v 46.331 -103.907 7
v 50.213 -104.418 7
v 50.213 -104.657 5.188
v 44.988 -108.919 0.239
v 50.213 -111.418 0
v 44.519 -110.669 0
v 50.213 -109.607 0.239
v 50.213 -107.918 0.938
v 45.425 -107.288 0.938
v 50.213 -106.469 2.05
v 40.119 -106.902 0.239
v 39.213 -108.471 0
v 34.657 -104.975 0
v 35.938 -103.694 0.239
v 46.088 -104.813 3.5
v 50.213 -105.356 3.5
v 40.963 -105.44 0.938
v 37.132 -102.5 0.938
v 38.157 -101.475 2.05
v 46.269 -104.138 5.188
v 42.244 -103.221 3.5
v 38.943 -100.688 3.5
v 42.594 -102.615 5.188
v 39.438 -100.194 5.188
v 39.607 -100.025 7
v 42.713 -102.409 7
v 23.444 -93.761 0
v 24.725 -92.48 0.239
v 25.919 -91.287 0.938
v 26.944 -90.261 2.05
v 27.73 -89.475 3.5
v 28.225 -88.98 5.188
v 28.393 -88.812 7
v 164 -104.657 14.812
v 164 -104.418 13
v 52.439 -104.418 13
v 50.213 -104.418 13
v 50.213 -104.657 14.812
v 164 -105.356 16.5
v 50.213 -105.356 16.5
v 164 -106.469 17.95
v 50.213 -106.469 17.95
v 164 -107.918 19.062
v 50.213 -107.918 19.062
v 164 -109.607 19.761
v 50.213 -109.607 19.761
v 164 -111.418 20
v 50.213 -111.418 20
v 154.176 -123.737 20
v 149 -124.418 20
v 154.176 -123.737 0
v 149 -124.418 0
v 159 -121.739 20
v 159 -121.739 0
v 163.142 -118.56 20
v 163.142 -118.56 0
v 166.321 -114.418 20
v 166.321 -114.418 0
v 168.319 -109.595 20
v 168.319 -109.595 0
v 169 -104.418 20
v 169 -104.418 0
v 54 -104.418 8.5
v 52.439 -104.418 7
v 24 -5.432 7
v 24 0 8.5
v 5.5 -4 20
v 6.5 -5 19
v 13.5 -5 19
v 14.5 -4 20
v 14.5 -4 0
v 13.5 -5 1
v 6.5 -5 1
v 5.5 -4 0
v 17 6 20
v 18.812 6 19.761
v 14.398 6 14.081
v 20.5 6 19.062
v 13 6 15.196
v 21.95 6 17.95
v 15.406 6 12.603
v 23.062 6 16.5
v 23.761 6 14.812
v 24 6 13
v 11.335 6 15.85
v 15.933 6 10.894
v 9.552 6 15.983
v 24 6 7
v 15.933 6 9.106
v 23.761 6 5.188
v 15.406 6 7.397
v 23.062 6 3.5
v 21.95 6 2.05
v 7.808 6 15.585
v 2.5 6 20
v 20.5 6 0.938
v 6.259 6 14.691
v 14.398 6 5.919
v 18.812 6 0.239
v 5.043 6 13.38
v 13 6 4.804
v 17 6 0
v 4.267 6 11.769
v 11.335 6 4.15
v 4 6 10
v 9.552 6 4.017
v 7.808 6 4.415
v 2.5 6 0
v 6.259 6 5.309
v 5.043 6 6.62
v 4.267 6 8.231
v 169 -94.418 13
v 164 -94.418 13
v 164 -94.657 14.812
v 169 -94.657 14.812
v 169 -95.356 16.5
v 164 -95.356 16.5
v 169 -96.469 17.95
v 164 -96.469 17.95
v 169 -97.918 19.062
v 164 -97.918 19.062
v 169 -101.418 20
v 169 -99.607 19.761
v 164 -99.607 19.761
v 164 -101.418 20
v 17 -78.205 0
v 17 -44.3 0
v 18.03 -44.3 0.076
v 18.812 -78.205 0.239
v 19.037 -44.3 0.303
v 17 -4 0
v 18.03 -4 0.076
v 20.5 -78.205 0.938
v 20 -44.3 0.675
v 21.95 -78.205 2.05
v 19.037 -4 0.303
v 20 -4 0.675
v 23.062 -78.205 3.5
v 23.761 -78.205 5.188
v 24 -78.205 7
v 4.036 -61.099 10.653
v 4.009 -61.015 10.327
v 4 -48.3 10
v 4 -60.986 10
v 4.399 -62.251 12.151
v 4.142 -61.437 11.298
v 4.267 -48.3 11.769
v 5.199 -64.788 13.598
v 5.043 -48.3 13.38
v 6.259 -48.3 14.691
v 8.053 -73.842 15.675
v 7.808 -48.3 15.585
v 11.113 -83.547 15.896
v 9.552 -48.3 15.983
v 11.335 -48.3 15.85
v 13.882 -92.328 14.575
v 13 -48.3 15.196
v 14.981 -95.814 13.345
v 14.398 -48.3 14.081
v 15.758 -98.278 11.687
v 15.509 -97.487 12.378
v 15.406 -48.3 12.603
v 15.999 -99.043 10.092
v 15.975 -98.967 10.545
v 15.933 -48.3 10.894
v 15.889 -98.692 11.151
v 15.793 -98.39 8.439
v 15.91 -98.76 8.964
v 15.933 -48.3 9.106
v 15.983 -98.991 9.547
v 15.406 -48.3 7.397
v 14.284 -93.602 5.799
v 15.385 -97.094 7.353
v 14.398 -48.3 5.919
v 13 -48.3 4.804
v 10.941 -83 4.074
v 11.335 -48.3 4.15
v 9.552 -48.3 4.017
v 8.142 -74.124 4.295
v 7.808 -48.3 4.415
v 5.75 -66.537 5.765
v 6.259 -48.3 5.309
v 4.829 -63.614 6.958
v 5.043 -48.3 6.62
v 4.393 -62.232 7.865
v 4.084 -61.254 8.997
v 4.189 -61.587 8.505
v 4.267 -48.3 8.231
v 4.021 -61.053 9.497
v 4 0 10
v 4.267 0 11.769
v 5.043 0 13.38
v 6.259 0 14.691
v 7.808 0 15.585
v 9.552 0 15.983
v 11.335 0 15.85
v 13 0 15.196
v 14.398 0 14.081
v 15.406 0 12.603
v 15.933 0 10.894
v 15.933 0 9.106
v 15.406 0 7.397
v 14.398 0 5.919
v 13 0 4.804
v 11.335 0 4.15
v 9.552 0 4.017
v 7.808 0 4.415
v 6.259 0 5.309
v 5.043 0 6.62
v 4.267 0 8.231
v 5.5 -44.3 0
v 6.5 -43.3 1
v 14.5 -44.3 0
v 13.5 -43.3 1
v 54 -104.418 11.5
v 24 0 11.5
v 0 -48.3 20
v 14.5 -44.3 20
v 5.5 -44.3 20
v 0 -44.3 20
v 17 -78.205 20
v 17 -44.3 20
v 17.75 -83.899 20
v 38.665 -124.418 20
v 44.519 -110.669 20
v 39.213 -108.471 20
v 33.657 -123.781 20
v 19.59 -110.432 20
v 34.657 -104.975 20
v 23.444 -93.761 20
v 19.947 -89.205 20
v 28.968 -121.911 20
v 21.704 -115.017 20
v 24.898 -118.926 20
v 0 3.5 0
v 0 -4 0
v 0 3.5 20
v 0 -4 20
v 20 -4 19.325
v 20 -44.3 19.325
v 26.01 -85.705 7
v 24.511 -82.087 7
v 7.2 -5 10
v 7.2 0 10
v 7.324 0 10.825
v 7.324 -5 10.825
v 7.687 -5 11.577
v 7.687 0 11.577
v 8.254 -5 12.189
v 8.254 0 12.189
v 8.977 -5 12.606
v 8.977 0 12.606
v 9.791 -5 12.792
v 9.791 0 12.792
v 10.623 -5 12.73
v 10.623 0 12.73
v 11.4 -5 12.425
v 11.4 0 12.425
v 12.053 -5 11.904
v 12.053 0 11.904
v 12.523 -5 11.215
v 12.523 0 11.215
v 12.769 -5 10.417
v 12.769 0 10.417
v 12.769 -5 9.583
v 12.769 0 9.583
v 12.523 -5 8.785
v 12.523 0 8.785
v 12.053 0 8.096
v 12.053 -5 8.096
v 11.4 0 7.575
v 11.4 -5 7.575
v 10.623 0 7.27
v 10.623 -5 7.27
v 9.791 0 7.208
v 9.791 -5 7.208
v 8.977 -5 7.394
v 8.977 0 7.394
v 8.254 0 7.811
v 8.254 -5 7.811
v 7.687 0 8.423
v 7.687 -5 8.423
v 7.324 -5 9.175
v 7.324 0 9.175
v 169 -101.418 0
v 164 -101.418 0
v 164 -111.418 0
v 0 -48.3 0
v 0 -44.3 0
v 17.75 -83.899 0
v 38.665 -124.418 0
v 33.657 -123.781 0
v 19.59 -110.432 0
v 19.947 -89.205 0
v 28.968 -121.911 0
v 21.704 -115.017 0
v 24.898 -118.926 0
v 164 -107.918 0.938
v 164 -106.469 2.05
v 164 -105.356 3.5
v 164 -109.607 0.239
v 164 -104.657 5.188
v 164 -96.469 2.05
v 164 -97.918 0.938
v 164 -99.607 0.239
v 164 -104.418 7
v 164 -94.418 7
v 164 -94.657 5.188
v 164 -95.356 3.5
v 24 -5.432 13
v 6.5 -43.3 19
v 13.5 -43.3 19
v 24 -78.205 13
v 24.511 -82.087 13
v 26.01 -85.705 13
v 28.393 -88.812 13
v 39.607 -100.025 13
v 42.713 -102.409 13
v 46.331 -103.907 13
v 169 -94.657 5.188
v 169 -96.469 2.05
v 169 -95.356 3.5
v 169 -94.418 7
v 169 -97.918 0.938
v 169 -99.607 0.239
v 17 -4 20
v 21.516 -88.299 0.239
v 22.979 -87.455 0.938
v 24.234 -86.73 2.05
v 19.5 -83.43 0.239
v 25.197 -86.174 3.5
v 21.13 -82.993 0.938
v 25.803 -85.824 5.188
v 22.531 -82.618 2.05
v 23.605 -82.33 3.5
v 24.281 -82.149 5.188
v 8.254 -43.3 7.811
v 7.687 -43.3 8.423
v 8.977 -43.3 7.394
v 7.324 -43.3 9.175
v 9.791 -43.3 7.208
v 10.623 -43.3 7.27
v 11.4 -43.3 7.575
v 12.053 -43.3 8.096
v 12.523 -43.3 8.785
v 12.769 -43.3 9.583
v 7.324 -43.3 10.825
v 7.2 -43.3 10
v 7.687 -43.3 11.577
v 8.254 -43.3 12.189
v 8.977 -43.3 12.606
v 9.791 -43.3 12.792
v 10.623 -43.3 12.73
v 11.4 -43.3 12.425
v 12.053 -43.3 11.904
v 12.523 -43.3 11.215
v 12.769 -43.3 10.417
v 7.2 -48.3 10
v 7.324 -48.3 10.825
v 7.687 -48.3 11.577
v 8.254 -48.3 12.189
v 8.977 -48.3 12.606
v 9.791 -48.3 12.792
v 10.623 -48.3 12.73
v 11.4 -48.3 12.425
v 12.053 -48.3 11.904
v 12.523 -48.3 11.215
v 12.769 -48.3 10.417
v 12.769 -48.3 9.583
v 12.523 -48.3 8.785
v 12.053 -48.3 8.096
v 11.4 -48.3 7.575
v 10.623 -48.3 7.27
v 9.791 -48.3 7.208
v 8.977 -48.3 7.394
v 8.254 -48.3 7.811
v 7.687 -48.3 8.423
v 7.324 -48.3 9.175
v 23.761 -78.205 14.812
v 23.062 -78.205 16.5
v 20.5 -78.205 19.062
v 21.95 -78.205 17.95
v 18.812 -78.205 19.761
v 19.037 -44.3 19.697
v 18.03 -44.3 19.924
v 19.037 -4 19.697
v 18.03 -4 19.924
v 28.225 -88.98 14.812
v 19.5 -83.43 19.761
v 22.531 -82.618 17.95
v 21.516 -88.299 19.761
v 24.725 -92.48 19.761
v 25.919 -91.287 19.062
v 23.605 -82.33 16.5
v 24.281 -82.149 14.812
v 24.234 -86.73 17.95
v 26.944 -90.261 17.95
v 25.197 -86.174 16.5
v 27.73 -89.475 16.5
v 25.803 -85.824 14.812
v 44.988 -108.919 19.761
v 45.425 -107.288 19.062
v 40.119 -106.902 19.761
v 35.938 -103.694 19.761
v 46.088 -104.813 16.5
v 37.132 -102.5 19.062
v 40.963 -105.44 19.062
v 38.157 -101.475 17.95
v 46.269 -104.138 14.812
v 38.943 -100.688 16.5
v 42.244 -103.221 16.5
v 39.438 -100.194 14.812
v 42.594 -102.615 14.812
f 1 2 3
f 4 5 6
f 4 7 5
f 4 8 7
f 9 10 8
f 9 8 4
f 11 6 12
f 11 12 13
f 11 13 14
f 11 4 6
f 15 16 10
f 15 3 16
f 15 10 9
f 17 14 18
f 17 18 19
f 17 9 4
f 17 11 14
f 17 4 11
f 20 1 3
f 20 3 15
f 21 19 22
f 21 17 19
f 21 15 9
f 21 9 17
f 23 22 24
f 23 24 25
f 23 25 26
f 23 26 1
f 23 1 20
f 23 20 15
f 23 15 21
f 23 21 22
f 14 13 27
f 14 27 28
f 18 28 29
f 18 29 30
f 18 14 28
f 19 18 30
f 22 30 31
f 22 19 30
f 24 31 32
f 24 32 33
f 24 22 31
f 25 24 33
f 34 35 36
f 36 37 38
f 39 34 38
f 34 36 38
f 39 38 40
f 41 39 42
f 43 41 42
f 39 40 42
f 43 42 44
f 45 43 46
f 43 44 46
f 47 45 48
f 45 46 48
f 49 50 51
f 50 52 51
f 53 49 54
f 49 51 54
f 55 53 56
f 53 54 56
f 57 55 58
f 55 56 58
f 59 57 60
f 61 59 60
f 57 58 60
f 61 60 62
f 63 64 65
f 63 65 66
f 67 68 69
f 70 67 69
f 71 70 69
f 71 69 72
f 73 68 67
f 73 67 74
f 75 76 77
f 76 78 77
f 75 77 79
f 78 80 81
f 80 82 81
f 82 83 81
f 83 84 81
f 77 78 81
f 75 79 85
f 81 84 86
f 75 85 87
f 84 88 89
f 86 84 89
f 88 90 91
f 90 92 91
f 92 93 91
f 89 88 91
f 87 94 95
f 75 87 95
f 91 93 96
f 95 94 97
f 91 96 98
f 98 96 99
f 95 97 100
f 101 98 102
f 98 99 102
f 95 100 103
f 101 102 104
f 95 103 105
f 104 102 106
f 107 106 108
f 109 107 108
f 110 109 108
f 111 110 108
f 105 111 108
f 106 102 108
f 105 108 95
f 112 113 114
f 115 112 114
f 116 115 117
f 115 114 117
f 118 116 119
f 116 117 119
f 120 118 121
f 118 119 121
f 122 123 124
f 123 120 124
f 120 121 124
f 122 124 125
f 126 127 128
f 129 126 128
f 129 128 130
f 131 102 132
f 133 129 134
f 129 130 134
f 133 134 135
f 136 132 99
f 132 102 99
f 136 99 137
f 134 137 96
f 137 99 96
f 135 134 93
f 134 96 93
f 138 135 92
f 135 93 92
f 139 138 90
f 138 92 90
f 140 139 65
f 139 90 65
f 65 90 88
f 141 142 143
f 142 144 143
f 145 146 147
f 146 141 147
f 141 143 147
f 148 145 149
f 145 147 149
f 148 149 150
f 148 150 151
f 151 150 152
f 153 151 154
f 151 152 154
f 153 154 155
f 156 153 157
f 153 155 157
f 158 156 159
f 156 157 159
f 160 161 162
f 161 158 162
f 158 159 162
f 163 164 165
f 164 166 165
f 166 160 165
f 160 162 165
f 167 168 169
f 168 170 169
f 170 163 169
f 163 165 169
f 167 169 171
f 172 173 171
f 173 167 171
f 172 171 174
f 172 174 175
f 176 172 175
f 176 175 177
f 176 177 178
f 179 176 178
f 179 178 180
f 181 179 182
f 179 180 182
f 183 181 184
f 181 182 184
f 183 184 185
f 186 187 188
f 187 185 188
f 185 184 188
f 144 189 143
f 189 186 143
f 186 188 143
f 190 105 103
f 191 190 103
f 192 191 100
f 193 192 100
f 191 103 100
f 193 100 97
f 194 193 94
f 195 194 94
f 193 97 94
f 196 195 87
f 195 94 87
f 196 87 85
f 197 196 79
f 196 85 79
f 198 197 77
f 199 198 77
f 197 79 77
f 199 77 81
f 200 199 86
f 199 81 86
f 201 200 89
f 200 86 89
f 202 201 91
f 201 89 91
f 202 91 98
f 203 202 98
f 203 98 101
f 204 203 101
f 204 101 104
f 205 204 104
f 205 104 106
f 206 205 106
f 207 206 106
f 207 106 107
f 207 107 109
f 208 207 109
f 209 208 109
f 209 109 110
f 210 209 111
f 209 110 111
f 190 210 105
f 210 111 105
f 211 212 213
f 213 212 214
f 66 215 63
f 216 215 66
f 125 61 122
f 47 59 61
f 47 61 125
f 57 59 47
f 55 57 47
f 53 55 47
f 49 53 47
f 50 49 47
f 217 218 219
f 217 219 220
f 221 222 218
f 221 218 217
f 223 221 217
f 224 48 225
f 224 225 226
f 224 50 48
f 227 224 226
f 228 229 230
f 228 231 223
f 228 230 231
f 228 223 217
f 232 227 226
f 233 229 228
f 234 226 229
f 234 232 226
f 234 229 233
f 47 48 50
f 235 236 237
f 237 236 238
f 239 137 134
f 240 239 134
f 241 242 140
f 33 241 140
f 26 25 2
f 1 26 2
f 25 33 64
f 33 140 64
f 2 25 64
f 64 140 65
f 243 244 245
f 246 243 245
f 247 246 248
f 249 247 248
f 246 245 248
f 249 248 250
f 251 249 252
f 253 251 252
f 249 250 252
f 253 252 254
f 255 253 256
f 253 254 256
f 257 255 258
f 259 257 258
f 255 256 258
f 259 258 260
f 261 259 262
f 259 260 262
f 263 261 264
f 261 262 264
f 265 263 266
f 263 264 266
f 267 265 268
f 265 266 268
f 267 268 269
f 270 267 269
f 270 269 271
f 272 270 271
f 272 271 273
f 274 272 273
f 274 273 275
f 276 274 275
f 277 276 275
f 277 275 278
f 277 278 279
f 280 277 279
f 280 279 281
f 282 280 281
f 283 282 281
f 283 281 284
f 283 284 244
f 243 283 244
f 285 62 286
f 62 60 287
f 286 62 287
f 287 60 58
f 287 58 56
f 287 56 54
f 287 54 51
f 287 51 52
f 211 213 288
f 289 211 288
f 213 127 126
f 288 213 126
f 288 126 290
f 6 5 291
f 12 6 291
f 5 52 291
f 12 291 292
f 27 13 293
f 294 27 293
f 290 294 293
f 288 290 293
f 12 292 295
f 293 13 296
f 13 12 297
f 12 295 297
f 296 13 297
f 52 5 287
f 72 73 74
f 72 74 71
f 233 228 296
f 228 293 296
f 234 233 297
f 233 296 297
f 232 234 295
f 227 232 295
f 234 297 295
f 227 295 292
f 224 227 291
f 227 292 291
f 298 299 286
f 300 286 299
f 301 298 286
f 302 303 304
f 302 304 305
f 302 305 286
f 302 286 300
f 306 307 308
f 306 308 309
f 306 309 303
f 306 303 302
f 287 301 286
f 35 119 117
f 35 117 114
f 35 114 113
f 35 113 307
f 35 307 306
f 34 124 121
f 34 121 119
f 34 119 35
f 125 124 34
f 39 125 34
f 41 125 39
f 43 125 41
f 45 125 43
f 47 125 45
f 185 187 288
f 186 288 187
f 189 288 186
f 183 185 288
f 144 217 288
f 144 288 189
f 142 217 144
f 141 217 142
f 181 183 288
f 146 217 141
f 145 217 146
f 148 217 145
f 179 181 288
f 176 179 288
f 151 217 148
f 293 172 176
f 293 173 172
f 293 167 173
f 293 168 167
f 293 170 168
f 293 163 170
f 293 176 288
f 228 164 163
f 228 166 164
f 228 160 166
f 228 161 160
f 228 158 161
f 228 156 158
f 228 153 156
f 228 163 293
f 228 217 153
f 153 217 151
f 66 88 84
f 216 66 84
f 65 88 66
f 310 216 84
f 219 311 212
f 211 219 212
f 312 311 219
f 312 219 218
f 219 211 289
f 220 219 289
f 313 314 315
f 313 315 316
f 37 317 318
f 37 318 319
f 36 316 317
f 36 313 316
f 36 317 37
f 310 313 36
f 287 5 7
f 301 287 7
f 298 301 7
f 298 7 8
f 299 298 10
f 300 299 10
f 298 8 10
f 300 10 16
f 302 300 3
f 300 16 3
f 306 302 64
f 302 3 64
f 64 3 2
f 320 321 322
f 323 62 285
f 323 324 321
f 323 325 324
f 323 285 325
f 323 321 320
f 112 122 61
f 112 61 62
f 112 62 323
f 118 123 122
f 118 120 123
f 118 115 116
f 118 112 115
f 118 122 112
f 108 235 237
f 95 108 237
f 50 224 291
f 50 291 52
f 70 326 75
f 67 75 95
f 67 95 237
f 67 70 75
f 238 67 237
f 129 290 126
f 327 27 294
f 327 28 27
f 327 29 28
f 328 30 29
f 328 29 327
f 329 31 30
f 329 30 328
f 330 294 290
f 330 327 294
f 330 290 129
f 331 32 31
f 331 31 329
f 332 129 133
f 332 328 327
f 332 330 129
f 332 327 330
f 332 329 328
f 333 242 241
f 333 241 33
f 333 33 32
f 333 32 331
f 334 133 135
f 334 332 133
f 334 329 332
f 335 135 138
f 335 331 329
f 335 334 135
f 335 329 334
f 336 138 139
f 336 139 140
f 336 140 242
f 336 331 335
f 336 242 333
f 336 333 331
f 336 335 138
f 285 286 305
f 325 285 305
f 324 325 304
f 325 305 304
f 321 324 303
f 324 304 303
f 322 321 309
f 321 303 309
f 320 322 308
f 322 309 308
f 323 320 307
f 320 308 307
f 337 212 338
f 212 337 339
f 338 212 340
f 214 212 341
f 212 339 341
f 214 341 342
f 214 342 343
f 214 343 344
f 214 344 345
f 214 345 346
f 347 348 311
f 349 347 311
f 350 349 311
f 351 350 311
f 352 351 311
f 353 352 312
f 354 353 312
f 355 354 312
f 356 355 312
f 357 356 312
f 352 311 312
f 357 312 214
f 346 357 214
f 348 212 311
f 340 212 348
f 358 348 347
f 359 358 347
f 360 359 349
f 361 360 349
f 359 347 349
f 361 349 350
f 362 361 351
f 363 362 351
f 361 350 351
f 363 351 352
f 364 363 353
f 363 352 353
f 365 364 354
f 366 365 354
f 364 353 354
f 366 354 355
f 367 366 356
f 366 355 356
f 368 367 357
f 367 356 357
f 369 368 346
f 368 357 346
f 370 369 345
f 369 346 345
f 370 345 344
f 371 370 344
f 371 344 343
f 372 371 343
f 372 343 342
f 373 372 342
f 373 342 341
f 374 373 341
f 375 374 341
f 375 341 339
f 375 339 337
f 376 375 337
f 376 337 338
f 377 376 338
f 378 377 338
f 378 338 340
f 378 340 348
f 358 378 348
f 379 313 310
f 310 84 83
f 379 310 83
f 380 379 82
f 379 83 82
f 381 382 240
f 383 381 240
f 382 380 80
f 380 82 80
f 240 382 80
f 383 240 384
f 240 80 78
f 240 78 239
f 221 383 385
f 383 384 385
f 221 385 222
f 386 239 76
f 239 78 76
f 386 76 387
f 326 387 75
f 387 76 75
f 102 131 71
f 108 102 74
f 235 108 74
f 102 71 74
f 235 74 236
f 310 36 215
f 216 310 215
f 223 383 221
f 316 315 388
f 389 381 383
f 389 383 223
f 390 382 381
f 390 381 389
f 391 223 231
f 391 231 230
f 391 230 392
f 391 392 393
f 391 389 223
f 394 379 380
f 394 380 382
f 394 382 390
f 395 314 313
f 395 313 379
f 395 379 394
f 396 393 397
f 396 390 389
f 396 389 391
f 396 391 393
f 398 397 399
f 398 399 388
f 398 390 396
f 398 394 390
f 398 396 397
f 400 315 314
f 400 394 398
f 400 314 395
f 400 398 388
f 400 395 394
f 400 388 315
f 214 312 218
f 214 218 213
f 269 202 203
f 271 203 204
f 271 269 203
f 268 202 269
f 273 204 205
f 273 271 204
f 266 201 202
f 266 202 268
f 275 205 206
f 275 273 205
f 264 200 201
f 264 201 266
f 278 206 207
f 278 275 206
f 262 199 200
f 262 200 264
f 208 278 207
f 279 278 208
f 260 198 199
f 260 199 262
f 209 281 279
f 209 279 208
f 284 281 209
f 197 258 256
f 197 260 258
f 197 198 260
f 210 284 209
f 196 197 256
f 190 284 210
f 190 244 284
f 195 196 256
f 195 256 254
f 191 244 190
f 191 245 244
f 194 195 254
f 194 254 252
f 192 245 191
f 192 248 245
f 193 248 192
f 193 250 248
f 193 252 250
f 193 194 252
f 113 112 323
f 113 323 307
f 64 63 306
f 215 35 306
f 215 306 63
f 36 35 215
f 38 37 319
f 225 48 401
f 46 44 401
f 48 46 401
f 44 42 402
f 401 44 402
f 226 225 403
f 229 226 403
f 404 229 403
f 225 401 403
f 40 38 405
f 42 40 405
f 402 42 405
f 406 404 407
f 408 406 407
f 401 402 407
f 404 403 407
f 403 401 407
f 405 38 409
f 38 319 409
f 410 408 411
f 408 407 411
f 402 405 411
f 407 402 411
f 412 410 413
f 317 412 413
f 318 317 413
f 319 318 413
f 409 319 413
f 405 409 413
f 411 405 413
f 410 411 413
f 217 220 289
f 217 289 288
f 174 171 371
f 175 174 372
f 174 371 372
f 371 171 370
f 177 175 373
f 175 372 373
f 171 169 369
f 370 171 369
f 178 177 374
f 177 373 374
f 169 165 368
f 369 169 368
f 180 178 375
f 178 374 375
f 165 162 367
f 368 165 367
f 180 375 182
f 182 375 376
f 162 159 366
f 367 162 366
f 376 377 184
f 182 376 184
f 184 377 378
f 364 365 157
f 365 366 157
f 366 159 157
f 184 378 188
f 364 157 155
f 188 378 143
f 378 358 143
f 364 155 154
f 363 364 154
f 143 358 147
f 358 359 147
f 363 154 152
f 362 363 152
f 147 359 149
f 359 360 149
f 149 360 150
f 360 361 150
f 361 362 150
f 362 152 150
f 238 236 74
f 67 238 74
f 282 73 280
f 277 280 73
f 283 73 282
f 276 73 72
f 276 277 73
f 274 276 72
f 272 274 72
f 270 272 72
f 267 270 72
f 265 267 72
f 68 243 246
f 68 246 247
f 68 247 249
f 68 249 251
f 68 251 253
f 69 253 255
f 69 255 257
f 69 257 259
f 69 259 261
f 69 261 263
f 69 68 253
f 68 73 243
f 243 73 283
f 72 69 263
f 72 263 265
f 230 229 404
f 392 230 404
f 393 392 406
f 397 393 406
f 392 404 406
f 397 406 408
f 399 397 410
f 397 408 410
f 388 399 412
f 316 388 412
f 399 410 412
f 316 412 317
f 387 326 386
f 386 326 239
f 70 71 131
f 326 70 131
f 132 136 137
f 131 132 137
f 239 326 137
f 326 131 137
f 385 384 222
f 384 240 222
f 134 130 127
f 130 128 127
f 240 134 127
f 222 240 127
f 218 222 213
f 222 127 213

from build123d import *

# Parameters (mm, degrees)
F1_DEPTH      = 20
F2_W          = 9
F2_H          = 1
F3_DEPTH      = 20
F4_SIZE       = 0.99999
F6_DEPTH      = 20
F9_DEPTH      = 3
F10_SIZE      = 20
F11_DEPTH     = 6
F13_R         = 2.8
F14_DEPTH     = 130.4192752567
F15_R         = 6
F16_DEPTH     = 76.1192752567
F17_R         = 6
F18_DEPTH     = 6
F19_R         = 15
F20_T1_DEPTH  = 113.7867965644
F20_T3_DEPTH  = 40
F20_T5_DEPTH  = 15.8578643763
F20_T7_DEPTH  = 101.7050718211
F20_T10_ANGLE = 45
F20_T12_ANGLE = 45
F20_T14_ANGLE = 45
F20_T16_ANGLE = 45
F21_SIZE      = 1.5
F22_R         = 20
F23_SIZE      = 2.5


# Not quite as in the source:
# - a fillet or chamfer that OpenCascade refuses, or shapes differently, is made with other operations: its cross-section is extruded or revolved along the edge and cut away or added
# - a fillet or chamfer is up to 0.001 mm smaller than in the source, because OpenCascade refuses the exact size


with BuildPart() as f1:
    # F0 (on Top) → F1 (new body)
    with BuildSketch(Plane.XY):
        Polygon((24, 0), (0, 0), (0, -4), (20, -4), (20, -44.3), (0, -44.3), (0, -48.3), (24, -48.3), align=None)
    extrude(amount=F1_DEPTH)

    # F2 (on face) → F3 (join, through all)
    with BuildSketch(Plane.XY.offset(20)):
        with Locations((10, -4.5)):
            Rectangle(F2_W, F2_H)
        with Locations((10, -43.8)):
            Rectangle(F2_W, F2_H)
    extrude(amount=-F3_DEPTH)

    # F4 (size 1 in the source; OpenCascade refuses exactly that, so slightly less here)
    f4_edges = [f1.edges().sort_by_distance(p)[0] for p in [
        (5.5, -5, 10),
        (14.5, -5, 10),
        (10, -5, 20),
        (10, -5, 0),
        (14.5, -43.3, 10),
        (5.5, -43.3, 10),
        (10, -43.3, 20),
        (10, -43.3, 0),
    ]]
    chamfer(f4_edges, length=F4_SIZE)

    # F5 (on face) → F6 (join, through all)
    with BuildSketch(Plane.XY.offset(20)):
        Polygon((24, -48.3), (0, -48.3), (24, -124.4182752567), (169, -124.4182752567), (169, -94.4182752567), (164, -94.4182752567), (164, -104.4182752567), (24, -104.4182752567), align=None)
    extrude(amount=-F6_DEPTH)

    # F8 (on offset) → F9 (join, symmetric)
    with BuildSketch(Plane.XY.offset(10)):
        Polygon((54, -104.4182752567), (24, 0), (24, -104.4182752567), align=None)
    extrude(amount=F9_DEPTH, both=True)

    # F10
    f10_edges = [f1.edges().sort_by_distance(p)[0] for p in [
        (24, -104.418275, 16.5),
        (24, -104.418275, 3.5),
    ]]
    chamfer(f10_edges, length=F10_SIZE)

    # F11 (add): a face of the model
    f11_faces = [f1.faces().sort_by_distance(p)[0] for p in [
        (12, 0, 10),
    ]]
    extrude(f11_faces, amount=F11_DEPTH)

    # F13 (on face) → F14 (cut, through all)
    with BuildSketch(Plane(origin=(0, 6, 0), x_dir=(-1, 0, 0), z_dir=(0, 1, 0))):
        with Locations((-10, 10)):
            Circle(F13_R)
    extrude(amount=-F14_DEPTH, mode=Mode.SUBTRACT)

    # F15 (on offset) → F16 (cut, through all)
    with BuildSketch(Plane(origin=(0, -48.3, 0), x_dir=(-1, 0, 0), z_dir=(0, 1, 0))):
        with Locations((-10, 10)):
            Circle(F15_R)
    extrude(amount=-F16_DEPTH, mode=Mode.SUBTRACT)

    # F17 (on face) → F18 (cut)
    with BuildSketch(Plane(origin=(0, 6, 0), x_dir=(-1, 0, 0), z_dir=(0, 1, 0))):
        with Locations((-10, 10)):
            Circle(F17_R)
    extrude(amount=-F18_DEPTH, mode=Mode.SUBTRACT)

    # F19
    f19_edges = [f1.edges().sort_by_distance(p)[0] for p in [
        (44, -104.418275, 3.5),
        (24, -84.418275, 3.5),
        (24, -84.418275, 16.5),
        (44, -104.418275, 16.5),
    ]]
    fillet(f19_edges, radius=F19_R)

    # F20: fillet of radius 7 on 12 edges, made by hand

    # F20_s2 → F20_t1 (cut)
    with BuildSketch(Plane.YZ.offset(50.2132034356)):
        with BuildLine():
            ThreePointArc((-104.4182752567, 13), (-106.4685277884, 17.9497474683), (-111.4182752567, 20))
            Line((-111.4182752567, 20), (-104.4182752567, 20))
            Line((-104.4182752567, 20), (-104.4182752567, 13))
        make_face()
        with BuildLine():
            ThreePointArc((-111.4182752567, 0), (-106.4685277884, 2.0502525317), (-104.4182752567, 7))
            Line((-104.4182752567, 7), (-104.4182752567, 0))
            Line((-104.4182752567, 0), (-111.4182752567, 0))
        make_face()
    extrude(amount=F20_T1_DEPTH, mode=Mode.SUBTRACT)

    # F20_s4 → F20_t3 (cut)
    with BuildSketch(Plane.YZ.offset(146.5)):
        with BuildLine():
            ThreePointArc((-101.4182752567, 0), (-96.4685277884, 2.0502525317), (-94.4182752567, 7))
            Line((-94.4182752567, 7), (-94.4182752567, 0))
            Line((-94.4182752567, 0), (-101.4182752567, 0))
        make_face()
        with BuildLine():
            ThreePointArc((-94.4182752567, 13), (-96.4685277884, 17.9497474683), (-101.4182752567, 20))
            Line((-101.4182752567, 20), (-94.4182752567, 20))
            Line((-94.4182752567, 20), (-94.4182752567, 13))
        make_face()
    extrude(amount=F20_T3_DEPTH, mode=Mode.SUBTRACT)

    # F20_s6 → F20_t5 (cut)
    with BuildSketch(Plane(origin=(69.8157393462, -69.8157393462, 0), x_dir=(0, 0, 1), z_dir=(-0.7071067812, 0.7071067812, 0))):
        with BuildLine():
            ThreePointArc((0, -49.7221721416), (2.0502525317, -44.7724246733), (7, -42.7221721416))
            Line((7, -42.7221721416), (0, -42.7221721416))
            Line((0, -42.7221721416), (0, -49.7221721416))
        make_face()
        with BuildLine():
            ThreePointArc((20, -49.7221721416), (17.9497474683, -44.7724246733), (13, -42.7221721416))
            Line((13, -42.7221721416), (20, -42.7221721416))
            Line((20, -42.7221721416), (20, -49.7221721416))
        make_face()
    extrude(amount=F20_T5_DEPTH, mode=Mode.SUBTRACT)

    # F20_s8 → F20_t7 (cut)
    with BuildSketch(Plane.XZ.offset(-23.5)):
        with BuildLine():
            ThreePointArc((17, 0), (21.9497474683, 2.0502525317), (24, 7))
            Line((24, 7), (24, 0))
            Line((24, 0), (17, 0))
        make_face()
        with BuildLine():
            ThreePointArc((24, 13), (21.9497474683, 17.9497474683), (17, 20))
            Line((17, 20), (24, 20))
            Line((24, 20), (24, 13))
        make_face()
    extrude(amount=F20_T7_DEPTH, mode=Mode.SUBTRACT)

    # F20_s9 → F20_t10 (revolve, cut)
    with BuildSketch(Plane.YZ.offset(50.2132034356)):
        with BuildLine():
            ThreePointArc((-111.4182752567, 0), (-106.4685277884, 2.0502525317), (-104.4182752567, 7))
            Line((-104.4182752567, 7), (-104.4182752567, 0))
            Line((-104.4182752567, 0), (-111.4182752567, 0))
        make_face()
    revolve(axis=Axis((50.2132034356, -89.4182752567, 0), (0, 0, -1)), revolution_arc=F20_T10_ANGLE, mode=Mode.SUBTRACT)

    # F20_s11 → F20_t12 (revolve, cut)
    with BuildSketch(Plane(origin=(58.6025359106, -58.6025359106, 0), x_dir=(0, 0, 1), z_dir=(0.7071067812, -0.7071067812, 0))):
        with BuildLine():
            ThreePointArc((0, 49.7221721416), (2.0502525317, 44.7724246733), (7, 42.7221721416))
            Line((7, 42.7221721416), (0, 42.7221721416))
            Line((0, 42.7221721416), (0, 49.7221721416))
        make_face()
    revolve(axis=Axis((39, -78.2050718211, 0), (0, 0, -1)), revolution_arc=F20_T12_ANGLE, mode=Mode.SUBTRACT)

    # F20_s13 → F20_t14 (revolve, cut)
    with BuildSketch(Plane.YZ.offset(50.2132034356)):
        with BuildLine():
            ThreePointArc((-111.4182752567, 20), (-106.4685277884, 17.9497474683), (-104.4182752567, 13))
            Line((-104.4182752567, 13), (-104.4182752567, 20))
            Line((-104.4182752567, 20), (-111.4182752567, 20))
        make_face()
    revolve(axis=Axis((50.2132034356, -89.4182752567, 20), (0, 0, -1)), revolution_arc=F20_T14_ANGLE, mode=Mode.SUBTRACT)

    # F20_s15 → F20_t16 (revolve, cut)
    with BuildSketch(Plane.XZ.offset(78.2050718211)):
        with BuildLine():
            ThreePointArc((17, 20), (21.9497474683, 17.9497474683), (24, 13))
            Line((24, 13), (24, 20))
            Line((24, 20), (17, 20))
        make_face()
    revolve(axis=Axis((39, -78.2050718211, 20), (0, 0, 1)), revolution_arc=F20_T16_ANGLE, mode=Mode.SUBTRACT)

    # F21
    f21_edges = [f1.edges().sort_by_distance(p)[0] for p in [
        (39, -52.209138, 13),
        (39, -52.209138, 7),
    ]]
    chamfer(f21_edges, length=F21_SIZE)

    # F22
    f22_edges = [f1.edges().sort_by_distance(p)[0] for p in [
        (24, -124.418275, 10),
        (169, -124.418275, 10),
    ]]
    fillet(f22_edges, radius=F22_R)

    # F23
    f23_edges = [f1.edges().sort_by_distance(p)[0] for p in [
        (0, 6, 10),
    ]]
    chamfer(f23_edges, length=F23_SIZE)


solid = f1.part
